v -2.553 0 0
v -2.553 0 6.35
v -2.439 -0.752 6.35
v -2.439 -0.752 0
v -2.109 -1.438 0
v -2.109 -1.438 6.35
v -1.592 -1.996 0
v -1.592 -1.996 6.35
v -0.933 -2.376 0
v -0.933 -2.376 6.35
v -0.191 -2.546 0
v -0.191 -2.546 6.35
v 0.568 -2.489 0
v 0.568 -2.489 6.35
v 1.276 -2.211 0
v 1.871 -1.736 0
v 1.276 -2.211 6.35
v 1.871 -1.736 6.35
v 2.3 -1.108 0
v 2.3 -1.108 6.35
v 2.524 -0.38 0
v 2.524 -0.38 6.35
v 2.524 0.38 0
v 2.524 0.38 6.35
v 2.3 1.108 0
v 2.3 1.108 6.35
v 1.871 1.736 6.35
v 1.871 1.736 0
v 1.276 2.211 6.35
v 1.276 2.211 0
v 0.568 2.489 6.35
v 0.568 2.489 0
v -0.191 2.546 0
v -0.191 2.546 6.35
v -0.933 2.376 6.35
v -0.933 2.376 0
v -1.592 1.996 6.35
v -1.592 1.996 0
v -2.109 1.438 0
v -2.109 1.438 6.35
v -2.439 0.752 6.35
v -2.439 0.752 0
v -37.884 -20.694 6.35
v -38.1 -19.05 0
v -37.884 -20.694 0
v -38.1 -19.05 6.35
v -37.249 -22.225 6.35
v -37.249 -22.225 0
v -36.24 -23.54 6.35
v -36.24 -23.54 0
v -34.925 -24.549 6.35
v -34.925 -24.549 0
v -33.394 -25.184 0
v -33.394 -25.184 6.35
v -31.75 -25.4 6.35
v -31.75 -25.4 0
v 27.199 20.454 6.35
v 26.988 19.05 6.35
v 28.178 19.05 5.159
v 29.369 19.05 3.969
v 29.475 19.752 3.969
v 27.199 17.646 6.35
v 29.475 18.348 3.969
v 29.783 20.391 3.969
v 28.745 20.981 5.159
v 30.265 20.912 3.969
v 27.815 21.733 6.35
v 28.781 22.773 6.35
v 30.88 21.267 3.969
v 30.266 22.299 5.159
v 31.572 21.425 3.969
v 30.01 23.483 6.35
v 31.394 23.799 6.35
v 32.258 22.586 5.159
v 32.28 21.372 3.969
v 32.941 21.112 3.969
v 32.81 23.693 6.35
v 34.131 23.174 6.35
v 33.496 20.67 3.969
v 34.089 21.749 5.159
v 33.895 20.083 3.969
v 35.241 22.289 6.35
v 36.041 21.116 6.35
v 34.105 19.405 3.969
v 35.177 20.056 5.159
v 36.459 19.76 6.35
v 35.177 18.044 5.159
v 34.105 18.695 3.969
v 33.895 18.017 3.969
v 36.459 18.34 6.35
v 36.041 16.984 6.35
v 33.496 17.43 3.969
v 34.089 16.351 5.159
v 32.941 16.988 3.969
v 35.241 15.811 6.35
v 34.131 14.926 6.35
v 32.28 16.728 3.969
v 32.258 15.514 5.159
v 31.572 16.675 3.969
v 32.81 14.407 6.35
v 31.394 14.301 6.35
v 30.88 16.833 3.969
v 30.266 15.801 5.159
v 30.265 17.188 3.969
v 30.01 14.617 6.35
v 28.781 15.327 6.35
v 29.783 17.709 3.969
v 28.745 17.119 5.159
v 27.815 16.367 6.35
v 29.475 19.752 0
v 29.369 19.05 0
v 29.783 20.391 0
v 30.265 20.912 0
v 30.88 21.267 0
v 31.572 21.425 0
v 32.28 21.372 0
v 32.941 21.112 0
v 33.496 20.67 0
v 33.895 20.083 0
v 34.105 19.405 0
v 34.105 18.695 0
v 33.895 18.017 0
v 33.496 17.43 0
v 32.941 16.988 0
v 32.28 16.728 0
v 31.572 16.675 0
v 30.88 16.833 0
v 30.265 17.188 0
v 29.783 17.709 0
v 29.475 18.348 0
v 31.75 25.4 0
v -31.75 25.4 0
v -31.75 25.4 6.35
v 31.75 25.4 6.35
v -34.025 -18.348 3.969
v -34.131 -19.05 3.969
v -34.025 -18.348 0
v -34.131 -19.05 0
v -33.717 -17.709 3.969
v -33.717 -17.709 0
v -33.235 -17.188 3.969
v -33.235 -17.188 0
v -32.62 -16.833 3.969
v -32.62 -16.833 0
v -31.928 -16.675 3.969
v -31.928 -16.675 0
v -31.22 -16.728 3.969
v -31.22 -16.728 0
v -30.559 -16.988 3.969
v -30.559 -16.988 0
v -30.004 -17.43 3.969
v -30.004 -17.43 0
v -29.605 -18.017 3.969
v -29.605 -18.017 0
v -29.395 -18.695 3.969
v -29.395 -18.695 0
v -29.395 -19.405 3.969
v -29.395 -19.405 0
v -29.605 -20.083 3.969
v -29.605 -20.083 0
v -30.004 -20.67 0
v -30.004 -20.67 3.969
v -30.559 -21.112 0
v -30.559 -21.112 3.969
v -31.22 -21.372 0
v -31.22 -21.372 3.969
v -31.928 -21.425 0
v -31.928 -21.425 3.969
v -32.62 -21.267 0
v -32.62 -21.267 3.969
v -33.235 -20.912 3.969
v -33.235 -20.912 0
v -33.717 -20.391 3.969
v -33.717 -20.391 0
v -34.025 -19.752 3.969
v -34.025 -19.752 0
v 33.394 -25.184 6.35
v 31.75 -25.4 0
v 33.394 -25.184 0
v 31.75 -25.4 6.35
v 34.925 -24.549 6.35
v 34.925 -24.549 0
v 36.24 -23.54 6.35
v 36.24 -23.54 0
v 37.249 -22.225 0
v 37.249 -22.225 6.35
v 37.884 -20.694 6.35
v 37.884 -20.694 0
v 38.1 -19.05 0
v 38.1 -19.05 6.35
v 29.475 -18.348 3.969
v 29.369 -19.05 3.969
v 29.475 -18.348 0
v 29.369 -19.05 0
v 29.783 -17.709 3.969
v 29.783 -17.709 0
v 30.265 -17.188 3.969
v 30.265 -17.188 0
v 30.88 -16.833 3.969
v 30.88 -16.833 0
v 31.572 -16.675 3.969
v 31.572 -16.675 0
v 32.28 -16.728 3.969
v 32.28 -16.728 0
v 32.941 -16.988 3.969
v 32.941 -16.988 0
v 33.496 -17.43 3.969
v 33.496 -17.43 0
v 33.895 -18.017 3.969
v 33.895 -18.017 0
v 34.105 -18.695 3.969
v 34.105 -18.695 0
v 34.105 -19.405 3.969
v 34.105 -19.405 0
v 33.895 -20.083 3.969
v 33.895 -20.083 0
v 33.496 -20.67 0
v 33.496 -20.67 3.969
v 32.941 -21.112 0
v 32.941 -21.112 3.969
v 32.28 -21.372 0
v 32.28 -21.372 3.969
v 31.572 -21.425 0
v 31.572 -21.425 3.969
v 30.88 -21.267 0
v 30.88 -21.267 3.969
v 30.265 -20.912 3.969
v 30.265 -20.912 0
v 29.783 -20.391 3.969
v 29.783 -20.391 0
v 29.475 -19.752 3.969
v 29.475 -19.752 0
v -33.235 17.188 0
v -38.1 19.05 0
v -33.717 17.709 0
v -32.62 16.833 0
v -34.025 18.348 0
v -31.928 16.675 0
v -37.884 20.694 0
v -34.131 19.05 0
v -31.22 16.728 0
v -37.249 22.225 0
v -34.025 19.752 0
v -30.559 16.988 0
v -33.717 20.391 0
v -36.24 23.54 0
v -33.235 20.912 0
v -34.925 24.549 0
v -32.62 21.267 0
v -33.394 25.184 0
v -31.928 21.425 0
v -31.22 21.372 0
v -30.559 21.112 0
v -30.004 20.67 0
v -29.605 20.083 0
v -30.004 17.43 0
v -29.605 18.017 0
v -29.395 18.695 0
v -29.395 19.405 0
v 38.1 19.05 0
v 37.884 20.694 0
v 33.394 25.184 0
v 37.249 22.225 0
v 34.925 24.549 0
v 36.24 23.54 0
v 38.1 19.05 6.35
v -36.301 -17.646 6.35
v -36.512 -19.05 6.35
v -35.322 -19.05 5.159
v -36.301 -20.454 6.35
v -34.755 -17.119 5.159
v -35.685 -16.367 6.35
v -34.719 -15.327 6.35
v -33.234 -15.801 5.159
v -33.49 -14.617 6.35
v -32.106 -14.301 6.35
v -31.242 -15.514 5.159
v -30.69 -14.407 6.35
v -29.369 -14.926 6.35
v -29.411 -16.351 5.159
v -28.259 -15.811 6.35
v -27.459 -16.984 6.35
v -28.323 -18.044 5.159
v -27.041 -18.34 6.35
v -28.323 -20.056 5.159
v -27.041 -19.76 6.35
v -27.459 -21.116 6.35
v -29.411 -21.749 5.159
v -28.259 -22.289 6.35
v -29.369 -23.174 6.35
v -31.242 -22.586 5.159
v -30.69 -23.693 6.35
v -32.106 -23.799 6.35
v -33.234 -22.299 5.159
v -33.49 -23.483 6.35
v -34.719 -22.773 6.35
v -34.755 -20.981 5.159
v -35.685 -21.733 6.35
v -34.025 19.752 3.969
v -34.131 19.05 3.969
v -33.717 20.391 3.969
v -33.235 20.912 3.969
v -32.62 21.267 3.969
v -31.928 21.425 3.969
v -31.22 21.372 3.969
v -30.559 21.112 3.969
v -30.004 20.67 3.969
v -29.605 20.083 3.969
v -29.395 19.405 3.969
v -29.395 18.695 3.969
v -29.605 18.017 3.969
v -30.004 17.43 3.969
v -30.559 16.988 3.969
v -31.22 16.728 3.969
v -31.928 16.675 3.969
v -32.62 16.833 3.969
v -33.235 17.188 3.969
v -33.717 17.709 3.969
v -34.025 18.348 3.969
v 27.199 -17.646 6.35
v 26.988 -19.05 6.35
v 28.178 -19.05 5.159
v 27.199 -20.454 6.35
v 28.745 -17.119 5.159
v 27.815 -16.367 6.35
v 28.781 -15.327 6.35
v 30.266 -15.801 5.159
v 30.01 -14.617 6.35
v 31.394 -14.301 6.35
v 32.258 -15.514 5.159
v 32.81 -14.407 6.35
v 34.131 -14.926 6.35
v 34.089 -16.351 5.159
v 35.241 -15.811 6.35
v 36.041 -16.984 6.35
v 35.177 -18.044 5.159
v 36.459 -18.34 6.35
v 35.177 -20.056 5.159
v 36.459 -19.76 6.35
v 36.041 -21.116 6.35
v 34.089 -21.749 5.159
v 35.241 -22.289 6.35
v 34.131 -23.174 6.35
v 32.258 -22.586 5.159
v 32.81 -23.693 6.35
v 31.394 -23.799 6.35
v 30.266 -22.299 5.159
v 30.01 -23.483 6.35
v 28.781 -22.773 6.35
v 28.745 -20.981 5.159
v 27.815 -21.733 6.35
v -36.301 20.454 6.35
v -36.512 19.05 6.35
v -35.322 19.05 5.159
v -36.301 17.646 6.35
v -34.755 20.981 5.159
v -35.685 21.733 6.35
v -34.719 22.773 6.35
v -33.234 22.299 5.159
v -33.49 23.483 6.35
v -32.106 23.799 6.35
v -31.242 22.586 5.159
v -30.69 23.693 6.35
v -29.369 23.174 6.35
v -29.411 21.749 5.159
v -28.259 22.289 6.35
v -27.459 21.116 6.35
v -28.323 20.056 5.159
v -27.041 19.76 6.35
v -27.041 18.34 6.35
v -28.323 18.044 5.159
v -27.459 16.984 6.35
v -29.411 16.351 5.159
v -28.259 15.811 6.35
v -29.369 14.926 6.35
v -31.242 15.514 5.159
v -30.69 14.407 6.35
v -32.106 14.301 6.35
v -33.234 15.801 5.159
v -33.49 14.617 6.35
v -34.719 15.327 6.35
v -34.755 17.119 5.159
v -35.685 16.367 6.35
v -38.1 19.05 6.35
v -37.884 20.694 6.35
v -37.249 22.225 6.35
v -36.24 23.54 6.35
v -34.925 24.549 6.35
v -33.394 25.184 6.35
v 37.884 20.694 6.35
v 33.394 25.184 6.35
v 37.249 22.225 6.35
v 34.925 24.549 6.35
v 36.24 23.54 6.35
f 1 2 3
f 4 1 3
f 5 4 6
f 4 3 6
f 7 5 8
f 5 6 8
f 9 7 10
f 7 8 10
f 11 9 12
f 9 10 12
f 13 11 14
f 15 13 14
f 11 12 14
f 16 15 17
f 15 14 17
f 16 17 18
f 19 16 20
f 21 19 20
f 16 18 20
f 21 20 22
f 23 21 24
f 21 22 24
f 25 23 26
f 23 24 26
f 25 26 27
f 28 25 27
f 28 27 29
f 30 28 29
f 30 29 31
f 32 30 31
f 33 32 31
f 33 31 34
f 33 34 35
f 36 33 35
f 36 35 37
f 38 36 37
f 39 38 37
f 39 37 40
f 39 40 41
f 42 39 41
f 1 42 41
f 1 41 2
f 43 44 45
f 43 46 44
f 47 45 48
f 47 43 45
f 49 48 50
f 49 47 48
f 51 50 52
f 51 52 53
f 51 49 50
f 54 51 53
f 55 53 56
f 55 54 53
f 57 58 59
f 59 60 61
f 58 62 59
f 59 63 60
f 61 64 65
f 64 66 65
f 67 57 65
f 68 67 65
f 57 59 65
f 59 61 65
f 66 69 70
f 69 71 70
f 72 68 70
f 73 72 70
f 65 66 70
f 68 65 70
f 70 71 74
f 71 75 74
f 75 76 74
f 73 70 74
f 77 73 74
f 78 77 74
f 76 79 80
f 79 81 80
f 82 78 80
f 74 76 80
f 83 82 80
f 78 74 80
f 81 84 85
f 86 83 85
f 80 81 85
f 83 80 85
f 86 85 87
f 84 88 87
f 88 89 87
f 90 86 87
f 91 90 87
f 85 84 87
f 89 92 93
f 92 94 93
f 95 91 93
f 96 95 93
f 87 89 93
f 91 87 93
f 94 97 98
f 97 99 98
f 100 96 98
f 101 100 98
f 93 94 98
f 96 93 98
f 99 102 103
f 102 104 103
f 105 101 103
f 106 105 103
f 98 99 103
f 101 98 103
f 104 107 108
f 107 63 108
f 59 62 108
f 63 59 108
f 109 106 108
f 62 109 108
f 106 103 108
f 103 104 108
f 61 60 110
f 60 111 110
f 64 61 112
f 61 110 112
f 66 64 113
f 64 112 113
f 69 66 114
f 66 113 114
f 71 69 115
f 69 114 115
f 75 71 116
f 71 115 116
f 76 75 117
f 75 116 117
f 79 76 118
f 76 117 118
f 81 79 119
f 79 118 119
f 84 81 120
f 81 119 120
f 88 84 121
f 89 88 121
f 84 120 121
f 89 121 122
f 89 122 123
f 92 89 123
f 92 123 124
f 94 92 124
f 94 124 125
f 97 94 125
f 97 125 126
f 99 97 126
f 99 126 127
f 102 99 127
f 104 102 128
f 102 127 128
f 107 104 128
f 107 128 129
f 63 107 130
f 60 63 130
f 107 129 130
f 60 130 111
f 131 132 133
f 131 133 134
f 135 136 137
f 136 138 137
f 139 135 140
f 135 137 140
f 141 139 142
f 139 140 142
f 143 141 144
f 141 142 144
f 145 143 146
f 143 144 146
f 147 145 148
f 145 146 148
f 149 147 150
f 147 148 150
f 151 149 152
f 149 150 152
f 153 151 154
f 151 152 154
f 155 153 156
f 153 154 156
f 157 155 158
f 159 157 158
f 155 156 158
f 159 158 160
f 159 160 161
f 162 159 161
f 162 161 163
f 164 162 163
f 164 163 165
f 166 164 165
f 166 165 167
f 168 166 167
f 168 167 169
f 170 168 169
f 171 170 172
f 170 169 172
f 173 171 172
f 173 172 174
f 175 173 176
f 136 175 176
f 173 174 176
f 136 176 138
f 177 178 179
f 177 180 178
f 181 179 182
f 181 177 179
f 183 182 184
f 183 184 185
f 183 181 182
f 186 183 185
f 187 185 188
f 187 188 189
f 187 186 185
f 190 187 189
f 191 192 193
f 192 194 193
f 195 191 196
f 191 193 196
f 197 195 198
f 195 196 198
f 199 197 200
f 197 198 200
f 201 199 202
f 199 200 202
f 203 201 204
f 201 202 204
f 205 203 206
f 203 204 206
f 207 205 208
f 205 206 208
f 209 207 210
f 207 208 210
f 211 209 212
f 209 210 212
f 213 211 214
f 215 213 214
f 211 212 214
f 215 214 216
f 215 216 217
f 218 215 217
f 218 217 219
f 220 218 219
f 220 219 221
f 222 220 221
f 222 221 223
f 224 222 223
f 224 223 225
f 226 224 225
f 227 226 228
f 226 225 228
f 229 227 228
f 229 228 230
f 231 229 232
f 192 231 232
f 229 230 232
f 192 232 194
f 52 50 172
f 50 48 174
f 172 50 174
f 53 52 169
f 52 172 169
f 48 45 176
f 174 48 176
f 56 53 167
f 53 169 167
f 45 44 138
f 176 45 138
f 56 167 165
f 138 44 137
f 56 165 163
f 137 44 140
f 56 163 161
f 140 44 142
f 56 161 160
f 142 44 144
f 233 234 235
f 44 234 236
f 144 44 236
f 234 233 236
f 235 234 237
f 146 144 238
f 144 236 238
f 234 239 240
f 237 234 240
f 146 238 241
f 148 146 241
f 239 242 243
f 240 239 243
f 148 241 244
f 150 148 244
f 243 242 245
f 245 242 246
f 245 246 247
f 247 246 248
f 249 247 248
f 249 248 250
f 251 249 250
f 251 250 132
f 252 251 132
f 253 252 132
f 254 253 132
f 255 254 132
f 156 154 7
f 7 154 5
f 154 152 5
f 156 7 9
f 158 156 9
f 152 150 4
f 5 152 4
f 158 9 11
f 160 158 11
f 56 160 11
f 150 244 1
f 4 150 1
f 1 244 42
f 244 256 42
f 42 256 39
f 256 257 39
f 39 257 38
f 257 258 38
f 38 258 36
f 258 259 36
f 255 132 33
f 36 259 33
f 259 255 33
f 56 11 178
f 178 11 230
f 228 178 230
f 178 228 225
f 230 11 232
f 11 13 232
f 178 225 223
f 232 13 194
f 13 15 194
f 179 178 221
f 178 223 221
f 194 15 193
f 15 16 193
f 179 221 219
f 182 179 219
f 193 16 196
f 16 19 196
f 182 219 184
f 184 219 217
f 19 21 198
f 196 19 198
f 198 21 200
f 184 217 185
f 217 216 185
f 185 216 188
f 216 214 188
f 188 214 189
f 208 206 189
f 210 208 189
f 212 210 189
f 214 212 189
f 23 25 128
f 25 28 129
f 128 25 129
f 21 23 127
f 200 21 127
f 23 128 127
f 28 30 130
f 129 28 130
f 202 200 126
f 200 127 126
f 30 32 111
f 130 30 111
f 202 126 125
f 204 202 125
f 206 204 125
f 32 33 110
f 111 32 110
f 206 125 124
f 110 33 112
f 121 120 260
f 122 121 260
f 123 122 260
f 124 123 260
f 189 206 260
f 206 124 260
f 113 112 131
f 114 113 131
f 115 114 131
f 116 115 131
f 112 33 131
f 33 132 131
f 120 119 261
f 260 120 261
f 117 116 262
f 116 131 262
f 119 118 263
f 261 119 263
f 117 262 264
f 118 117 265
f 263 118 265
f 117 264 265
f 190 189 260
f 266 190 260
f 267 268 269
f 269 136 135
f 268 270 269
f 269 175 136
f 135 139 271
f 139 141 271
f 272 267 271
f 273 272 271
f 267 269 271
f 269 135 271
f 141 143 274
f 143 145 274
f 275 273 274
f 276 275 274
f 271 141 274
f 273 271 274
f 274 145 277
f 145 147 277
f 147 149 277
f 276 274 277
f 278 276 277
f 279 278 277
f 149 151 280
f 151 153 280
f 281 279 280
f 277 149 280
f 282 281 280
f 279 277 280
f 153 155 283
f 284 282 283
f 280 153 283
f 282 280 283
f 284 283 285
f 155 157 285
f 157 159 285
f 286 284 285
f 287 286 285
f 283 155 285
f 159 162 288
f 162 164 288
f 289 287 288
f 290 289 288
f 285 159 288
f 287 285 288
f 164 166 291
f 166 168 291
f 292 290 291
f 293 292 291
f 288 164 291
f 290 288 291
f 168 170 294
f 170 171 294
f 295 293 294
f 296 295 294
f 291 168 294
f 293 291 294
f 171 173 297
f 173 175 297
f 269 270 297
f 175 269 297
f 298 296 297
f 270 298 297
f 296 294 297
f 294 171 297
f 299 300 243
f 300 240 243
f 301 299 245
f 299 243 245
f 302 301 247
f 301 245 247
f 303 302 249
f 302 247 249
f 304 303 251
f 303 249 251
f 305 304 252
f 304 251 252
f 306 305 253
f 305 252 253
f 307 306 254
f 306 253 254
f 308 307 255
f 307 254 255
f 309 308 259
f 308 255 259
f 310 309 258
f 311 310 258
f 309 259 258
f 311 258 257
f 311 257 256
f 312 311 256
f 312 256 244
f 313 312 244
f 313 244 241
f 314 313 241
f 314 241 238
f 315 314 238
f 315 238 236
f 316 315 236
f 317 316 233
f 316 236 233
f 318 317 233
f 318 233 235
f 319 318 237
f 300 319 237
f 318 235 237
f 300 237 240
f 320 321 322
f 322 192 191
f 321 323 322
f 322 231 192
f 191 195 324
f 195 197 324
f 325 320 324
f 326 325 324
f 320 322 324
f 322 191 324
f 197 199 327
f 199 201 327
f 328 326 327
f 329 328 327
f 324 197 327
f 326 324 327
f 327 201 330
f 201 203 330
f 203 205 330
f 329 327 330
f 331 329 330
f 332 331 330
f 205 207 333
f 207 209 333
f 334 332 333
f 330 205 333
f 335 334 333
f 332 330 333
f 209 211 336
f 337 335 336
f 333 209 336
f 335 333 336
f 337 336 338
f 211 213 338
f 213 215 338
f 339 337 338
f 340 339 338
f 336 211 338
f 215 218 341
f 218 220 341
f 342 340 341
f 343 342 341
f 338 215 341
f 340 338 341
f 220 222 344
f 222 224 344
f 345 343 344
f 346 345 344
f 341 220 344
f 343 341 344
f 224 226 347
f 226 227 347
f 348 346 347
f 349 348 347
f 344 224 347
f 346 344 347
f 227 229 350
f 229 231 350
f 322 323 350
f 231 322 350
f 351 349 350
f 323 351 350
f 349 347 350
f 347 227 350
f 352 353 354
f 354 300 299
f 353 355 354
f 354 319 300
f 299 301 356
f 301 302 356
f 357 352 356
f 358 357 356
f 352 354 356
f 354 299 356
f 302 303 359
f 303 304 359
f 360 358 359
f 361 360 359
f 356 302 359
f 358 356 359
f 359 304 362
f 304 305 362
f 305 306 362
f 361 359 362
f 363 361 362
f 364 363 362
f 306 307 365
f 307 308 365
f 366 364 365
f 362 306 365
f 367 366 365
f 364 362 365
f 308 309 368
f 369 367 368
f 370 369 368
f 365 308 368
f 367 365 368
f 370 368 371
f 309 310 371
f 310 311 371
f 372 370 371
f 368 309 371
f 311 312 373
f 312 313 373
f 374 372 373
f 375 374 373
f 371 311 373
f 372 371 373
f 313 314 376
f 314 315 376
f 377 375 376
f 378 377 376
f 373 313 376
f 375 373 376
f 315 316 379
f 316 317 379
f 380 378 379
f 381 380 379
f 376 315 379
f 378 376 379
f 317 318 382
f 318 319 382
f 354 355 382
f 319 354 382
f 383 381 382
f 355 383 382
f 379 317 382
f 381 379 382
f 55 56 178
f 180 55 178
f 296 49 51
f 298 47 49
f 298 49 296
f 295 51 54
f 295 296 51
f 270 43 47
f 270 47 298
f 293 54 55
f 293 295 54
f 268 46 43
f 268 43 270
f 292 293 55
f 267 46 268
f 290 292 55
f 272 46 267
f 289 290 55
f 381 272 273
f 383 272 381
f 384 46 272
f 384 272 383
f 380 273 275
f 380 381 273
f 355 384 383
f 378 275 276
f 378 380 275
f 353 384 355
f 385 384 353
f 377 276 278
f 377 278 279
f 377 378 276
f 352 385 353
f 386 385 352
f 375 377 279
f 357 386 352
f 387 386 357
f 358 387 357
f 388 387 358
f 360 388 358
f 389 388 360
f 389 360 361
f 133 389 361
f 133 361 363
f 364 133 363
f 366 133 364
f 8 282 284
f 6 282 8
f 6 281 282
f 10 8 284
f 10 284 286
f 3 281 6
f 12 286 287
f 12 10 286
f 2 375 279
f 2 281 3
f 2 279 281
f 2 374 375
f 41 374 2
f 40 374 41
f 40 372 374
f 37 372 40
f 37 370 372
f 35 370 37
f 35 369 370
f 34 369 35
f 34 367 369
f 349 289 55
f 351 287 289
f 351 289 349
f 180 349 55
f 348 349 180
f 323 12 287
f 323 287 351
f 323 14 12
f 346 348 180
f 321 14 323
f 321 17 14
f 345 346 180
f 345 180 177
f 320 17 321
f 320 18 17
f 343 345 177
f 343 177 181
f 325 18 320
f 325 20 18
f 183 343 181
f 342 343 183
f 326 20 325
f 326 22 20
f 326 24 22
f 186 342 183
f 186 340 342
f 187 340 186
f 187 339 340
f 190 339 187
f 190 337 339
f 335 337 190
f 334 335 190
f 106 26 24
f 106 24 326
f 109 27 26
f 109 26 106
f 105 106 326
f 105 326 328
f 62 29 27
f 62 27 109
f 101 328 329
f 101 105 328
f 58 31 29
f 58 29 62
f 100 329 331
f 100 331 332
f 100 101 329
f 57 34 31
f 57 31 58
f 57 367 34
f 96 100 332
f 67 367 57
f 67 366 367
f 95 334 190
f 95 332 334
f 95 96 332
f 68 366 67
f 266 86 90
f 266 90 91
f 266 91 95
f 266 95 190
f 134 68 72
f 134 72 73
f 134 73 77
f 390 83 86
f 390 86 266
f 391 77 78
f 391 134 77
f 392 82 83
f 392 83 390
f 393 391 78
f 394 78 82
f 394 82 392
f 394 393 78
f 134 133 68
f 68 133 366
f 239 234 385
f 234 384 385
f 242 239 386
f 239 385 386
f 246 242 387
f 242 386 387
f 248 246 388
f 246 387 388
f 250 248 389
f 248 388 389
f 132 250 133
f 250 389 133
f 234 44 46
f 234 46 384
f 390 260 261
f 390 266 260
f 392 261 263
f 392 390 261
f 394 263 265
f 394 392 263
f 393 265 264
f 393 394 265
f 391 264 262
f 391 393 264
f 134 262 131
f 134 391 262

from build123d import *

# Parameters (mm, degrees)
F1_W           = 76.2
F1_H           = 50.8
F2_DEPTH       = 6.35
F3_R           = 6.35
F5_D           = 4.7625
F5_CSINK_D     = 9.525
F5_CSINK_ANGLE = 90
F6_D           = 5.1054


with BuildPart() as f2:
    # F1 (on Top) → F2 (new body)
    with BuildSketch(Plane.XY):
        Rectangle(F1_W, F1_H)
    extrude(amount=F2_DEPTH)

    # F3
    f3_edges = [f2.edges().sort_by_distance(p)[0] for p in [
        (-38.1, -25.4, 3.175),
        (38.1, -25.4, 3.175),
        (38.1, 25.4, 3.175),
        (-38.1, 25.4, 3.175),
    ]]
    fillet(f3_edges, radius=F3_R)

    # F5 (through all)
    with Locations(Plane.XY.offset(6.35)):
        with Locations((-31.75, 19.05), (-31.75, -19.05), (31.75, -19.05), (31.75, 19.05)):
            CounterSinkHole(F5_D / 2, F5_CSINK_D / 2, counter_sink_angle=F5_CSINK_ANGLE)

    # F6 (through all)
    with Locations(Plane(origin=(0, 0, 0), x_dir=(1, 0, 0), z_dir=(0, 0, -1))):
        with Locations((0, 0)):
            Hole(F6_D / 2)


solid = f2.part
